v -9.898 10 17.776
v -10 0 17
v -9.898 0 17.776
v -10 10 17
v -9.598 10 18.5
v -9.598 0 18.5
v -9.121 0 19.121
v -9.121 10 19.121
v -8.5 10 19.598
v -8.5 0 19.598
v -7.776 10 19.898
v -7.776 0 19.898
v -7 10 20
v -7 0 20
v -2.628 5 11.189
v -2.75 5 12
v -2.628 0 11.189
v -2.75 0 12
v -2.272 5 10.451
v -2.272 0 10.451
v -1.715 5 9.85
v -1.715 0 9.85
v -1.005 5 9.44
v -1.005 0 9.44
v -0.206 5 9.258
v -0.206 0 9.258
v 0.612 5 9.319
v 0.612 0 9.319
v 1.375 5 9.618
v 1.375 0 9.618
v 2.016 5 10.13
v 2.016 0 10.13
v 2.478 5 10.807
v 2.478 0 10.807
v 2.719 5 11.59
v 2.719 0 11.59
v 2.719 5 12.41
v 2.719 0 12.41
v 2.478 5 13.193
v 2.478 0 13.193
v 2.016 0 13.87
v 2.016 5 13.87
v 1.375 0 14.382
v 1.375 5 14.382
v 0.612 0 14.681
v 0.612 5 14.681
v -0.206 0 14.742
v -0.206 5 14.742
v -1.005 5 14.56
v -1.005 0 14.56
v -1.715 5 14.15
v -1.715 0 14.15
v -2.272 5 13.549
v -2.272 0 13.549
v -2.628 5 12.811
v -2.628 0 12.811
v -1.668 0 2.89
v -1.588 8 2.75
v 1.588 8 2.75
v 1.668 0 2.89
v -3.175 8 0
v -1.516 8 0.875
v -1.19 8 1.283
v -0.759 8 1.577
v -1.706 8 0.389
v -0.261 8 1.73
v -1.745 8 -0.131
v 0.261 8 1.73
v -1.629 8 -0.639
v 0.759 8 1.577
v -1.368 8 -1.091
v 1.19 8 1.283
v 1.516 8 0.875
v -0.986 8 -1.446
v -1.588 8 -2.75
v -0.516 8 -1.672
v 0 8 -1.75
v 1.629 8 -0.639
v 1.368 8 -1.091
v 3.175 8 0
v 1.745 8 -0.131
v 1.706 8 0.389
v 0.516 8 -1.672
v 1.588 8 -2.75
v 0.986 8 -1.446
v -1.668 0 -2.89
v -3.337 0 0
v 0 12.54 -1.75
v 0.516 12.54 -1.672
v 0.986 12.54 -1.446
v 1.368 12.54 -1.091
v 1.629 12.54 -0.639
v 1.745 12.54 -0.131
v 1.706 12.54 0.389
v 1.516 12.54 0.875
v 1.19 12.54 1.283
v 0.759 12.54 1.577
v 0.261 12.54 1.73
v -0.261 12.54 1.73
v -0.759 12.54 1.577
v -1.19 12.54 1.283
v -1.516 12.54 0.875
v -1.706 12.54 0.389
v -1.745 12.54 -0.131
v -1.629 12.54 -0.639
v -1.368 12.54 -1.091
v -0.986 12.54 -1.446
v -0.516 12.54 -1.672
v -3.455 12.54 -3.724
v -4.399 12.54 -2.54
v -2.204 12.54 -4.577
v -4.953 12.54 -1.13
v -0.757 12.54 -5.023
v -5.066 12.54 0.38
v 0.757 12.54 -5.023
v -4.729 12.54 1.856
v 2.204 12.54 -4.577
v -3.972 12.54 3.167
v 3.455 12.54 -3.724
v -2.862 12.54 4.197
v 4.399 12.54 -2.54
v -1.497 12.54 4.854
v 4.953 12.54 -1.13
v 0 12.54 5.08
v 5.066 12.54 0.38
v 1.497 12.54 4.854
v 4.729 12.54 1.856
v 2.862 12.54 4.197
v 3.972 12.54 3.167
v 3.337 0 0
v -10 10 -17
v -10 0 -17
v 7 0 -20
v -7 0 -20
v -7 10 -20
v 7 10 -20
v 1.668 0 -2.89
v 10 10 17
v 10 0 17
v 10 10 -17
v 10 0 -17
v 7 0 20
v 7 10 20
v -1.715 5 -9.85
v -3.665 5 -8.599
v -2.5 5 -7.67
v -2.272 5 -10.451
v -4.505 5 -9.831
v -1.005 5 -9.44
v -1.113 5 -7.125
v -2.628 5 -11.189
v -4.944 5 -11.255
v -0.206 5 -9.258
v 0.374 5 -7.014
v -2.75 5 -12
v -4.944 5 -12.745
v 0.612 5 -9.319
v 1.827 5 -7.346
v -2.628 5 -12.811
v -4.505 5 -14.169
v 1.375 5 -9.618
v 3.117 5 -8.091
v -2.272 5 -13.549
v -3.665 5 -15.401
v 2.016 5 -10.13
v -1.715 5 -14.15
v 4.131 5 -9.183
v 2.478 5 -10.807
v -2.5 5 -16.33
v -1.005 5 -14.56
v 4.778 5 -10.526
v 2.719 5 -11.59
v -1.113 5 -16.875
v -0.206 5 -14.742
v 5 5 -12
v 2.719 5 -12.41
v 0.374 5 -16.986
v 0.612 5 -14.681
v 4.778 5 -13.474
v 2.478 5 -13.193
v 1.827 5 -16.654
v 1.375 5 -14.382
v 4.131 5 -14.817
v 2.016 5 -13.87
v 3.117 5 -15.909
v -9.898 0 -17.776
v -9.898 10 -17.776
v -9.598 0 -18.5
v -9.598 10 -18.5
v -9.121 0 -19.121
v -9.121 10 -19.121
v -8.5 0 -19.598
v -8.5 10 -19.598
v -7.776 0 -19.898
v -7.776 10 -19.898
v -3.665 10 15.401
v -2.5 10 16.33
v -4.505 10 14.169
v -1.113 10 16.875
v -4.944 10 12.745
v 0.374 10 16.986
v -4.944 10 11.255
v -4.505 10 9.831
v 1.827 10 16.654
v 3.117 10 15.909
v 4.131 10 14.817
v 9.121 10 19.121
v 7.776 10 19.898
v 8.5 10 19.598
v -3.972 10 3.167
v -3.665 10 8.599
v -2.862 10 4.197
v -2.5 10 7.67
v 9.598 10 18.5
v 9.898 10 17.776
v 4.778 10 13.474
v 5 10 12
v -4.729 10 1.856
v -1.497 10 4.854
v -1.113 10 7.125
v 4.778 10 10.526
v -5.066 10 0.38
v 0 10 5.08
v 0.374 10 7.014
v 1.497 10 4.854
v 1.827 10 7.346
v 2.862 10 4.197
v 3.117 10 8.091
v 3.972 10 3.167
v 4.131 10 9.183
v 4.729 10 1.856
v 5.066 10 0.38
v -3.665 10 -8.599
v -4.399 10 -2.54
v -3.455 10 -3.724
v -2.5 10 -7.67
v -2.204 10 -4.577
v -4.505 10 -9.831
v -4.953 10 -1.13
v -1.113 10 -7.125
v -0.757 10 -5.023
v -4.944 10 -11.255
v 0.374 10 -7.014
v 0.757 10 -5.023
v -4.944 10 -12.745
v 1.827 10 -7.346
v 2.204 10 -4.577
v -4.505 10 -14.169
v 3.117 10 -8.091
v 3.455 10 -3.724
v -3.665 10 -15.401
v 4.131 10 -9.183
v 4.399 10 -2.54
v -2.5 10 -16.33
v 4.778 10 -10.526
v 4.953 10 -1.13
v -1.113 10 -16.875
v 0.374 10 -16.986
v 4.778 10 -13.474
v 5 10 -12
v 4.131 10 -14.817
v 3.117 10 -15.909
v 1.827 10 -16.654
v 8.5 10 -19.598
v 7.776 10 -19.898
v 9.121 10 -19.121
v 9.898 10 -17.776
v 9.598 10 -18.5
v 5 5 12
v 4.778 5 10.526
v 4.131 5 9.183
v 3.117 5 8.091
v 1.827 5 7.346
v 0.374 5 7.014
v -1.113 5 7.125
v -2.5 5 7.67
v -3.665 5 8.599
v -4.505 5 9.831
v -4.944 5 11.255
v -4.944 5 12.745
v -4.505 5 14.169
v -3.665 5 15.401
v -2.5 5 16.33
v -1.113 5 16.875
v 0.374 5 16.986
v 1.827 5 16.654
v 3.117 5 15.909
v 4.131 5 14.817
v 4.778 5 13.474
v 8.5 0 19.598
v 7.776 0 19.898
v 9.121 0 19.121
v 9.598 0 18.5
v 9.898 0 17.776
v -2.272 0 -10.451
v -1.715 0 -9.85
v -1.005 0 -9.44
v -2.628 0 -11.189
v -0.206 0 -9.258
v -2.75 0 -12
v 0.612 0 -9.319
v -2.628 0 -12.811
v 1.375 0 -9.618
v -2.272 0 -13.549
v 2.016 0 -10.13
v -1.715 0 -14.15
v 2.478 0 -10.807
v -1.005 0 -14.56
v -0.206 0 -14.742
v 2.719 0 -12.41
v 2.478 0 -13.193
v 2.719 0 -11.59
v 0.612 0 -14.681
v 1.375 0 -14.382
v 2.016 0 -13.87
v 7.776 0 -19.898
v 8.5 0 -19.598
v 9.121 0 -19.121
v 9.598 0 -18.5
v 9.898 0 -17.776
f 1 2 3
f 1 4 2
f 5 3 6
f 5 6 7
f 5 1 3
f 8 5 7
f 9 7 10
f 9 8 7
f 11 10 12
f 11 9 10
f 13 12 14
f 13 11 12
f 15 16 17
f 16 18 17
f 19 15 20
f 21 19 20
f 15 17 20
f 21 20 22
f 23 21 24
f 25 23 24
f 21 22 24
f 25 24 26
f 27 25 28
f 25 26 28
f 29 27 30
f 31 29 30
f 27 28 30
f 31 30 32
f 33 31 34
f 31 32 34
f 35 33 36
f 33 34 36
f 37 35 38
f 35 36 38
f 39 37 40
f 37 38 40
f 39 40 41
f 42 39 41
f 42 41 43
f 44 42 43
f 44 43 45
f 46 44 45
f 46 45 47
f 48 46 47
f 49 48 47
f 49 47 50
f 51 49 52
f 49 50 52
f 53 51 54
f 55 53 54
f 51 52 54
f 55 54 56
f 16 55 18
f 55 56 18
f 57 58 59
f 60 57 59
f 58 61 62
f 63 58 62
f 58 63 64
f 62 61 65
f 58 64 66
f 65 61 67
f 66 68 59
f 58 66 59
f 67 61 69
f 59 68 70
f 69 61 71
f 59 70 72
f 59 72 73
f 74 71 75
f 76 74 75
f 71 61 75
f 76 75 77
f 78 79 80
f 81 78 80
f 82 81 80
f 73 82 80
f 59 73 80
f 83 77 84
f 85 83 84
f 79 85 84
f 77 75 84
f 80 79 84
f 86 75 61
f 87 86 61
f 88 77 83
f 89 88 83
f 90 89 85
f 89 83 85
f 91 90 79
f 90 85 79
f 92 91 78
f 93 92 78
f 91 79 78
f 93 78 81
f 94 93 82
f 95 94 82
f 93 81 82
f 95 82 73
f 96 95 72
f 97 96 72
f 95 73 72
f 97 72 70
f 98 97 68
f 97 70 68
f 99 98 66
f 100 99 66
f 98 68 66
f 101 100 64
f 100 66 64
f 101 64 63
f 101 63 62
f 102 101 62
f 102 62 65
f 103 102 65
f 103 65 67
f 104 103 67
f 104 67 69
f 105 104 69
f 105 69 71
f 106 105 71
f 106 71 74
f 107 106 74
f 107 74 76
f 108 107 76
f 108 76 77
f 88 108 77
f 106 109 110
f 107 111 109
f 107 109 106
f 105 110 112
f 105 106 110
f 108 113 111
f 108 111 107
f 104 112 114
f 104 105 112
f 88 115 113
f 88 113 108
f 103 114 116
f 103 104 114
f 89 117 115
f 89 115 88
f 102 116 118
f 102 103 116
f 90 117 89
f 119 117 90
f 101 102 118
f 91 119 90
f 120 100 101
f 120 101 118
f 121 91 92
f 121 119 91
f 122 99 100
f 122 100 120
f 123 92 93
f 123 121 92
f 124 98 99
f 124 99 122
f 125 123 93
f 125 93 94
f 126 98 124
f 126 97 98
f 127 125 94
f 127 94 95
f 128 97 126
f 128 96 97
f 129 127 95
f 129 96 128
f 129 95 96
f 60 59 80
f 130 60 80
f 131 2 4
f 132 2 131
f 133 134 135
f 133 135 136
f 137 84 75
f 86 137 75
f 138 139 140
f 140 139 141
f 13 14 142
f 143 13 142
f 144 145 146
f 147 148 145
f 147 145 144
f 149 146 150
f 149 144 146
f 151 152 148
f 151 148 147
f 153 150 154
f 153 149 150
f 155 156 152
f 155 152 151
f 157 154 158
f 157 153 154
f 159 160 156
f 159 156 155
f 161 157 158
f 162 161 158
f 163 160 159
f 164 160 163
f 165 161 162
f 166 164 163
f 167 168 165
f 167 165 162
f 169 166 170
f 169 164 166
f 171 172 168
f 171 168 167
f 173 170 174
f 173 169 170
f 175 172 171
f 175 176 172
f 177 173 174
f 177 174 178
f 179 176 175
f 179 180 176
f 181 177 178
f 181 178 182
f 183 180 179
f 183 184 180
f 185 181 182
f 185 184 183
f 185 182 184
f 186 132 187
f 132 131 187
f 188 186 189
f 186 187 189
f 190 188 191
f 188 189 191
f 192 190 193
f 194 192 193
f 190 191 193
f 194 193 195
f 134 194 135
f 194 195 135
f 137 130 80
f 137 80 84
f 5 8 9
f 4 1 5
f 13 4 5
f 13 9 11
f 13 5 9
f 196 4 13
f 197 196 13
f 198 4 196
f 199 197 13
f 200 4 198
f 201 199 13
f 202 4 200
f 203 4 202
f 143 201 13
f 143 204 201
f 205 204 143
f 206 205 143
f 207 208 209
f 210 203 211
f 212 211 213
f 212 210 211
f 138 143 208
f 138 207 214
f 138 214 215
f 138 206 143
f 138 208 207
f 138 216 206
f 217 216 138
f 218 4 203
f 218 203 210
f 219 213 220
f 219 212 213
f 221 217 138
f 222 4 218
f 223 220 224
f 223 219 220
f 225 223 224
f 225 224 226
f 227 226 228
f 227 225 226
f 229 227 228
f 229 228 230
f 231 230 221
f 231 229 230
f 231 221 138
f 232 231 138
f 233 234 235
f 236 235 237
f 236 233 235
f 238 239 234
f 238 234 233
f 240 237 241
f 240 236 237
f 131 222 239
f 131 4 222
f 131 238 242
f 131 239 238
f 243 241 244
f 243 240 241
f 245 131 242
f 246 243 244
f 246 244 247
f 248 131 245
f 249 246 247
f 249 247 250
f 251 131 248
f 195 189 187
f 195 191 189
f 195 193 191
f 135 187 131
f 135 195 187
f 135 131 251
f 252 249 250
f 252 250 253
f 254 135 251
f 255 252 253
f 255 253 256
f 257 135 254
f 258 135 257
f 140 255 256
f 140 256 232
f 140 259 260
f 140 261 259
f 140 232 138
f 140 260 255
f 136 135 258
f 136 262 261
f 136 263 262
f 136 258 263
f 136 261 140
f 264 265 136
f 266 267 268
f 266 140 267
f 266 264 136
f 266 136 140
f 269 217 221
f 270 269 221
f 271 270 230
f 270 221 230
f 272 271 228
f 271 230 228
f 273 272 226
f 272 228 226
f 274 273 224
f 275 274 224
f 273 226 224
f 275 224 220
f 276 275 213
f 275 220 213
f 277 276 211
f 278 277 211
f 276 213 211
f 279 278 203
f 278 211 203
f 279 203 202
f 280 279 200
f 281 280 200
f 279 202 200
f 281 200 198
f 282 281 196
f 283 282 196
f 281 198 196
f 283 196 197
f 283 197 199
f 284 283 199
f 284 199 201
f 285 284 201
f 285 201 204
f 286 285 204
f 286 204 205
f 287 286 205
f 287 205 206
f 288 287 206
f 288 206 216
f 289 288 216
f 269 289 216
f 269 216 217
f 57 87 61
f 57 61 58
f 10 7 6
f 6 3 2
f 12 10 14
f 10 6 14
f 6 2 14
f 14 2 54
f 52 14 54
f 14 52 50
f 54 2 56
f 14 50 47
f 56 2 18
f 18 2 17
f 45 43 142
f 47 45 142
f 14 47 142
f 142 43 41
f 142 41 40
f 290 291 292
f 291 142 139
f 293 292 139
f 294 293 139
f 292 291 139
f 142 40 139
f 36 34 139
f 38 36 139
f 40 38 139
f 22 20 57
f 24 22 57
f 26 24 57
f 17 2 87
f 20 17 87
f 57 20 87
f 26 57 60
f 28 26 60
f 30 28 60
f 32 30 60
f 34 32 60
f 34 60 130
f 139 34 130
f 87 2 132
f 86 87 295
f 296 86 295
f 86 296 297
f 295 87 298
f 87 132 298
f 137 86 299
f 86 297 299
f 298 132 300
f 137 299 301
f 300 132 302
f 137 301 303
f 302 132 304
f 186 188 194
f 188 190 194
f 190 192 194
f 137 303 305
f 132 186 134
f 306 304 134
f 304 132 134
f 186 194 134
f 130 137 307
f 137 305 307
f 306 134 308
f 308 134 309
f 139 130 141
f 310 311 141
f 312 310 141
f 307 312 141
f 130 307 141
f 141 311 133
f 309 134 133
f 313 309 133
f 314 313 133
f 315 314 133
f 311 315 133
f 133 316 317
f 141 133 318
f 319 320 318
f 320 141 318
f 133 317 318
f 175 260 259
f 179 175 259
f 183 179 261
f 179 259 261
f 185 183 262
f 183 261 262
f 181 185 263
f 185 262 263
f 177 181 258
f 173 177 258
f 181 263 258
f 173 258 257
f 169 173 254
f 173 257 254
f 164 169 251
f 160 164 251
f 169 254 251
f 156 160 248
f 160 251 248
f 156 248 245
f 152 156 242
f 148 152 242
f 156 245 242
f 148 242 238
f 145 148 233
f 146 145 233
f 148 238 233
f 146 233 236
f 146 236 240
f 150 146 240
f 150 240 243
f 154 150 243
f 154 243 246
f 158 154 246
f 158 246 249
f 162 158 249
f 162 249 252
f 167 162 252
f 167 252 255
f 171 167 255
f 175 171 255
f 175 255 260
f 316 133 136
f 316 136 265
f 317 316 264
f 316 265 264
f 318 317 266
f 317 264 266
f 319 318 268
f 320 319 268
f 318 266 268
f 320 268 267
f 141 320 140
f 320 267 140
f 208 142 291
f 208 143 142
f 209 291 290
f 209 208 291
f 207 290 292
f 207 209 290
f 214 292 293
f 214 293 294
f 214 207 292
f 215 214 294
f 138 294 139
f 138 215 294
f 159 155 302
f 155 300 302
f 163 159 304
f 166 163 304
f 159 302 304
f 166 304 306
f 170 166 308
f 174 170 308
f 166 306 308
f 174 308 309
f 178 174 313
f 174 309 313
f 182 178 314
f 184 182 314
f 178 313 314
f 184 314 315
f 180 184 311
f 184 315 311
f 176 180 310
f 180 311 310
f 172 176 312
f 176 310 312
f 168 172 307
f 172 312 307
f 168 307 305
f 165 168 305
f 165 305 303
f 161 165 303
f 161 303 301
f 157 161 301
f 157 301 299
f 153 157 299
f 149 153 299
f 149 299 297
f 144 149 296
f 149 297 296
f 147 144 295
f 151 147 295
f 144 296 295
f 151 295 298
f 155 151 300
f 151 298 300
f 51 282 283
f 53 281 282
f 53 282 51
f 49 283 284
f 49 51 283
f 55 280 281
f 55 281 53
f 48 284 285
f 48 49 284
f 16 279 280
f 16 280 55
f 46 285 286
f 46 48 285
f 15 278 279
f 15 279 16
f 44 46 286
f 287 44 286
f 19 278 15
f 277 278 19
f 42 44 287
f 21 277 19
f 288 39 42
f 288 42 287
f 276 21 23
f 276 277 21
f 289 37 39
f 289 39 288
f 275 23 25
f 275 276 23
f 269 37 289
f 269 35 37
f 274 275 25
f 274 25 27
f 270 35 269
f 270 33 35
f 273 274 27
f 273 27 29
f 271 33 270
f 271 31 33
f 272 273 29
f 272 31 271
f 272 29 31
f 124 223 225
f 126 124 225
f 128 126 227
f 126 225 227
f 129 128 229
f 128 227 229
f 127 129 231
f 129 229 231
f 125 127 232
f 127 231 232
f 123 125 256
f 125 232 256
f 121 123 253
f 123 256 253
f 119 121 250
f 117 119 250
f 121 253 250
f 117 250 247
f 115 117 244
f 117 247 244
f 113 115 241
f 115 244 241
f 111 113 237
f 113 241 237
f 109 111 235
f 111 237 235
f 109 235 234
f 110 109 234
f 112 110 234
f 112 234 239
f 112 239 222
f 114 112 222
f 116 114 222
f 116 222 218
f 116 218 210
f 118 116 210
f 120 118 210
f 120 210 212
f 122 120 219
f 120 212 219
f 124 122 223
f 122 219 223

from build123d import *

# Parameters (mm, degrees)
SKETCH1_W                      = 20
SKETCH1_H                      = 40
BOSS_EXTRUDE1_DEPTH            = 10
CUT_EXTRUDE1_START             = -2
CUT_EXTRUDE1_DEPTH             = 23.494897428
CUT_EXTRUDE1_DRAFT             = 1
SKETCH4_R                      = 5.08
BOSS_EXTRUDE2_DEPTH            = 2.54
SKETCH5_R                      = 1.75
CUT_EXTRUDE2_DEPTH             = 24.748684174
CBORE_FOR_M5_SHCS1_D           = 5.5
CBORE_FOR_M5_SHCS1_DEPTH       = 12
CBORE_FOR_M5_SHCS1_CBORE_D     = 10
CBORE_FOR_M5_SHCS1_CBORE_DEPTH = 5
CBORE_FOR_M5_SHCS1_TIP         = 1.652366702
FILLET1_R                      = 3


with BuildPart() as part:
    # Sketch1 → Boss-Extrude1 (new body)
    with BuildSketch(Plane(origin=(0, 0, 0), x_dir=(1, 0, 0), z_dir=(0, 1, 0))):
        Rectangle(SKETCH1_W, SKETCH1_H)
    extrude(amount=BOSS_EXTRUDE1_DEPTH)


with BuildPart() as cut_extrude1_tool:
    # Sketch3 → Cut-Extrude1 (with draft: the straight prism first)
    with BuildSketch(Plane(origin=(0, 10, 0), x_dir=(1, 0, 0), z_dir=(0, 1, 0)).offset(CUT_EXTRUDE1_START)):
        Polygon((3.175426481, 0), (1.58771324, 2.75), (-1.58771324, 2.75), (-3.175426481, 0), (-1.58771324, -2.75), (1.58771324, -2.75), align=None)
    extrude(amount=-CUT_EXTRUDE1_DEPTH)
    # Cut-Extrude1: the draft: its side faces are tilted about the plane it starts from
    cut_extrude1_sides = [cut_extrude1_tool.faces().sort_by_distance(p)[0] for p in [
        (2.38156986, -3.747448714, -1.375),
        (0, -3.747448714, -2.75),
        (-2.38156986, -3.747448714, -1.375),
        (-2.38156986, -3.747448714, 1.375),
        (0, -3.747448714, 2.75),
        (2.38156986, -3.747448714, 1.375),
    ]]
    draft(cut_extrude1_sides, Plane(origin=(0, 10, 0), x_dir=(1, 0, 0), z_dir=(0, 1, 0)).offset(CUT_EXTRUDE1_START), CUT_EXTRUDE1_DRAFT)


with BuildPart() as part_1:
    add(part.part)

    # Cut-Extrude1: cut by cut_extrude1_tool
    add(cut_extrude1_tool.part, mode=Mode.SUBTRACT)

    # Sketch4 → Boss-Extrude2 (add)
    with BuildSketch(Plane(origin=(0, 10, 0), x_dir=(1, 0, 0), z_dir=(0, 1, 0))):
        with Locations(Location((0, 0, 0), (0, 0, 270))):
            Circle(SKETCH4_R)
    extrude(amount=BOSS_EXTRUDE2_DEPTH)

    # Sketch5 → Cut-Extrude2 (cut, through all)
    with BuildSketch(Plane.XZ.offset(-8)):
        with Locations(Location((0, 0, 0), (0, 0, 270))):
            Circle(SKETCH5_R)
    extrude(amount=-CUT_EXTRUDE2_DEPTH, mode=Mode.SUBTRACT)

    # CBORE for M5 SHCS1
    with Locations(Plane(origin=(0, 10, 0), x_dir=(1, 0, 0), z_dir=(0, 1, 0))):
        with Locations((0, -12), (0, 12)):
            CounterBoreHole(CBORE_FOR_M5_SHCS1_D / 2, CBORE_FOR_M5_SHCS1_CBORE_D / 2, CBORE_FOR_M5_SHCS1_CBORE_DEPTH, depth=CBORE_FOR_M5_SHCS1_DEPTH)
            with Locations((0, 0, -(CBORE_FOR_M5_SHCS1_DEPTH + CBORE_FOR_M5_SHCS1_TIP / 2))):  # 118° drill point
                Cone(0, CBORE_FOR_M5_SHCS1_D / 2, CBORE_FOR_M5_SHCS1_TIP, mode=Mode.SUBTRACT)

    # Fillet1
    fillet1_edges = [part_1.edges().sort_by_distance(p)[0] for p in [
        (10, 5, 20),
        (-10, 5, 20),
        (-10, 5, -20),
        (10, 5, -20),
    ]]
    fillet(fillet1_edges, radius=FILLET1_R)


solid = part_1.part
